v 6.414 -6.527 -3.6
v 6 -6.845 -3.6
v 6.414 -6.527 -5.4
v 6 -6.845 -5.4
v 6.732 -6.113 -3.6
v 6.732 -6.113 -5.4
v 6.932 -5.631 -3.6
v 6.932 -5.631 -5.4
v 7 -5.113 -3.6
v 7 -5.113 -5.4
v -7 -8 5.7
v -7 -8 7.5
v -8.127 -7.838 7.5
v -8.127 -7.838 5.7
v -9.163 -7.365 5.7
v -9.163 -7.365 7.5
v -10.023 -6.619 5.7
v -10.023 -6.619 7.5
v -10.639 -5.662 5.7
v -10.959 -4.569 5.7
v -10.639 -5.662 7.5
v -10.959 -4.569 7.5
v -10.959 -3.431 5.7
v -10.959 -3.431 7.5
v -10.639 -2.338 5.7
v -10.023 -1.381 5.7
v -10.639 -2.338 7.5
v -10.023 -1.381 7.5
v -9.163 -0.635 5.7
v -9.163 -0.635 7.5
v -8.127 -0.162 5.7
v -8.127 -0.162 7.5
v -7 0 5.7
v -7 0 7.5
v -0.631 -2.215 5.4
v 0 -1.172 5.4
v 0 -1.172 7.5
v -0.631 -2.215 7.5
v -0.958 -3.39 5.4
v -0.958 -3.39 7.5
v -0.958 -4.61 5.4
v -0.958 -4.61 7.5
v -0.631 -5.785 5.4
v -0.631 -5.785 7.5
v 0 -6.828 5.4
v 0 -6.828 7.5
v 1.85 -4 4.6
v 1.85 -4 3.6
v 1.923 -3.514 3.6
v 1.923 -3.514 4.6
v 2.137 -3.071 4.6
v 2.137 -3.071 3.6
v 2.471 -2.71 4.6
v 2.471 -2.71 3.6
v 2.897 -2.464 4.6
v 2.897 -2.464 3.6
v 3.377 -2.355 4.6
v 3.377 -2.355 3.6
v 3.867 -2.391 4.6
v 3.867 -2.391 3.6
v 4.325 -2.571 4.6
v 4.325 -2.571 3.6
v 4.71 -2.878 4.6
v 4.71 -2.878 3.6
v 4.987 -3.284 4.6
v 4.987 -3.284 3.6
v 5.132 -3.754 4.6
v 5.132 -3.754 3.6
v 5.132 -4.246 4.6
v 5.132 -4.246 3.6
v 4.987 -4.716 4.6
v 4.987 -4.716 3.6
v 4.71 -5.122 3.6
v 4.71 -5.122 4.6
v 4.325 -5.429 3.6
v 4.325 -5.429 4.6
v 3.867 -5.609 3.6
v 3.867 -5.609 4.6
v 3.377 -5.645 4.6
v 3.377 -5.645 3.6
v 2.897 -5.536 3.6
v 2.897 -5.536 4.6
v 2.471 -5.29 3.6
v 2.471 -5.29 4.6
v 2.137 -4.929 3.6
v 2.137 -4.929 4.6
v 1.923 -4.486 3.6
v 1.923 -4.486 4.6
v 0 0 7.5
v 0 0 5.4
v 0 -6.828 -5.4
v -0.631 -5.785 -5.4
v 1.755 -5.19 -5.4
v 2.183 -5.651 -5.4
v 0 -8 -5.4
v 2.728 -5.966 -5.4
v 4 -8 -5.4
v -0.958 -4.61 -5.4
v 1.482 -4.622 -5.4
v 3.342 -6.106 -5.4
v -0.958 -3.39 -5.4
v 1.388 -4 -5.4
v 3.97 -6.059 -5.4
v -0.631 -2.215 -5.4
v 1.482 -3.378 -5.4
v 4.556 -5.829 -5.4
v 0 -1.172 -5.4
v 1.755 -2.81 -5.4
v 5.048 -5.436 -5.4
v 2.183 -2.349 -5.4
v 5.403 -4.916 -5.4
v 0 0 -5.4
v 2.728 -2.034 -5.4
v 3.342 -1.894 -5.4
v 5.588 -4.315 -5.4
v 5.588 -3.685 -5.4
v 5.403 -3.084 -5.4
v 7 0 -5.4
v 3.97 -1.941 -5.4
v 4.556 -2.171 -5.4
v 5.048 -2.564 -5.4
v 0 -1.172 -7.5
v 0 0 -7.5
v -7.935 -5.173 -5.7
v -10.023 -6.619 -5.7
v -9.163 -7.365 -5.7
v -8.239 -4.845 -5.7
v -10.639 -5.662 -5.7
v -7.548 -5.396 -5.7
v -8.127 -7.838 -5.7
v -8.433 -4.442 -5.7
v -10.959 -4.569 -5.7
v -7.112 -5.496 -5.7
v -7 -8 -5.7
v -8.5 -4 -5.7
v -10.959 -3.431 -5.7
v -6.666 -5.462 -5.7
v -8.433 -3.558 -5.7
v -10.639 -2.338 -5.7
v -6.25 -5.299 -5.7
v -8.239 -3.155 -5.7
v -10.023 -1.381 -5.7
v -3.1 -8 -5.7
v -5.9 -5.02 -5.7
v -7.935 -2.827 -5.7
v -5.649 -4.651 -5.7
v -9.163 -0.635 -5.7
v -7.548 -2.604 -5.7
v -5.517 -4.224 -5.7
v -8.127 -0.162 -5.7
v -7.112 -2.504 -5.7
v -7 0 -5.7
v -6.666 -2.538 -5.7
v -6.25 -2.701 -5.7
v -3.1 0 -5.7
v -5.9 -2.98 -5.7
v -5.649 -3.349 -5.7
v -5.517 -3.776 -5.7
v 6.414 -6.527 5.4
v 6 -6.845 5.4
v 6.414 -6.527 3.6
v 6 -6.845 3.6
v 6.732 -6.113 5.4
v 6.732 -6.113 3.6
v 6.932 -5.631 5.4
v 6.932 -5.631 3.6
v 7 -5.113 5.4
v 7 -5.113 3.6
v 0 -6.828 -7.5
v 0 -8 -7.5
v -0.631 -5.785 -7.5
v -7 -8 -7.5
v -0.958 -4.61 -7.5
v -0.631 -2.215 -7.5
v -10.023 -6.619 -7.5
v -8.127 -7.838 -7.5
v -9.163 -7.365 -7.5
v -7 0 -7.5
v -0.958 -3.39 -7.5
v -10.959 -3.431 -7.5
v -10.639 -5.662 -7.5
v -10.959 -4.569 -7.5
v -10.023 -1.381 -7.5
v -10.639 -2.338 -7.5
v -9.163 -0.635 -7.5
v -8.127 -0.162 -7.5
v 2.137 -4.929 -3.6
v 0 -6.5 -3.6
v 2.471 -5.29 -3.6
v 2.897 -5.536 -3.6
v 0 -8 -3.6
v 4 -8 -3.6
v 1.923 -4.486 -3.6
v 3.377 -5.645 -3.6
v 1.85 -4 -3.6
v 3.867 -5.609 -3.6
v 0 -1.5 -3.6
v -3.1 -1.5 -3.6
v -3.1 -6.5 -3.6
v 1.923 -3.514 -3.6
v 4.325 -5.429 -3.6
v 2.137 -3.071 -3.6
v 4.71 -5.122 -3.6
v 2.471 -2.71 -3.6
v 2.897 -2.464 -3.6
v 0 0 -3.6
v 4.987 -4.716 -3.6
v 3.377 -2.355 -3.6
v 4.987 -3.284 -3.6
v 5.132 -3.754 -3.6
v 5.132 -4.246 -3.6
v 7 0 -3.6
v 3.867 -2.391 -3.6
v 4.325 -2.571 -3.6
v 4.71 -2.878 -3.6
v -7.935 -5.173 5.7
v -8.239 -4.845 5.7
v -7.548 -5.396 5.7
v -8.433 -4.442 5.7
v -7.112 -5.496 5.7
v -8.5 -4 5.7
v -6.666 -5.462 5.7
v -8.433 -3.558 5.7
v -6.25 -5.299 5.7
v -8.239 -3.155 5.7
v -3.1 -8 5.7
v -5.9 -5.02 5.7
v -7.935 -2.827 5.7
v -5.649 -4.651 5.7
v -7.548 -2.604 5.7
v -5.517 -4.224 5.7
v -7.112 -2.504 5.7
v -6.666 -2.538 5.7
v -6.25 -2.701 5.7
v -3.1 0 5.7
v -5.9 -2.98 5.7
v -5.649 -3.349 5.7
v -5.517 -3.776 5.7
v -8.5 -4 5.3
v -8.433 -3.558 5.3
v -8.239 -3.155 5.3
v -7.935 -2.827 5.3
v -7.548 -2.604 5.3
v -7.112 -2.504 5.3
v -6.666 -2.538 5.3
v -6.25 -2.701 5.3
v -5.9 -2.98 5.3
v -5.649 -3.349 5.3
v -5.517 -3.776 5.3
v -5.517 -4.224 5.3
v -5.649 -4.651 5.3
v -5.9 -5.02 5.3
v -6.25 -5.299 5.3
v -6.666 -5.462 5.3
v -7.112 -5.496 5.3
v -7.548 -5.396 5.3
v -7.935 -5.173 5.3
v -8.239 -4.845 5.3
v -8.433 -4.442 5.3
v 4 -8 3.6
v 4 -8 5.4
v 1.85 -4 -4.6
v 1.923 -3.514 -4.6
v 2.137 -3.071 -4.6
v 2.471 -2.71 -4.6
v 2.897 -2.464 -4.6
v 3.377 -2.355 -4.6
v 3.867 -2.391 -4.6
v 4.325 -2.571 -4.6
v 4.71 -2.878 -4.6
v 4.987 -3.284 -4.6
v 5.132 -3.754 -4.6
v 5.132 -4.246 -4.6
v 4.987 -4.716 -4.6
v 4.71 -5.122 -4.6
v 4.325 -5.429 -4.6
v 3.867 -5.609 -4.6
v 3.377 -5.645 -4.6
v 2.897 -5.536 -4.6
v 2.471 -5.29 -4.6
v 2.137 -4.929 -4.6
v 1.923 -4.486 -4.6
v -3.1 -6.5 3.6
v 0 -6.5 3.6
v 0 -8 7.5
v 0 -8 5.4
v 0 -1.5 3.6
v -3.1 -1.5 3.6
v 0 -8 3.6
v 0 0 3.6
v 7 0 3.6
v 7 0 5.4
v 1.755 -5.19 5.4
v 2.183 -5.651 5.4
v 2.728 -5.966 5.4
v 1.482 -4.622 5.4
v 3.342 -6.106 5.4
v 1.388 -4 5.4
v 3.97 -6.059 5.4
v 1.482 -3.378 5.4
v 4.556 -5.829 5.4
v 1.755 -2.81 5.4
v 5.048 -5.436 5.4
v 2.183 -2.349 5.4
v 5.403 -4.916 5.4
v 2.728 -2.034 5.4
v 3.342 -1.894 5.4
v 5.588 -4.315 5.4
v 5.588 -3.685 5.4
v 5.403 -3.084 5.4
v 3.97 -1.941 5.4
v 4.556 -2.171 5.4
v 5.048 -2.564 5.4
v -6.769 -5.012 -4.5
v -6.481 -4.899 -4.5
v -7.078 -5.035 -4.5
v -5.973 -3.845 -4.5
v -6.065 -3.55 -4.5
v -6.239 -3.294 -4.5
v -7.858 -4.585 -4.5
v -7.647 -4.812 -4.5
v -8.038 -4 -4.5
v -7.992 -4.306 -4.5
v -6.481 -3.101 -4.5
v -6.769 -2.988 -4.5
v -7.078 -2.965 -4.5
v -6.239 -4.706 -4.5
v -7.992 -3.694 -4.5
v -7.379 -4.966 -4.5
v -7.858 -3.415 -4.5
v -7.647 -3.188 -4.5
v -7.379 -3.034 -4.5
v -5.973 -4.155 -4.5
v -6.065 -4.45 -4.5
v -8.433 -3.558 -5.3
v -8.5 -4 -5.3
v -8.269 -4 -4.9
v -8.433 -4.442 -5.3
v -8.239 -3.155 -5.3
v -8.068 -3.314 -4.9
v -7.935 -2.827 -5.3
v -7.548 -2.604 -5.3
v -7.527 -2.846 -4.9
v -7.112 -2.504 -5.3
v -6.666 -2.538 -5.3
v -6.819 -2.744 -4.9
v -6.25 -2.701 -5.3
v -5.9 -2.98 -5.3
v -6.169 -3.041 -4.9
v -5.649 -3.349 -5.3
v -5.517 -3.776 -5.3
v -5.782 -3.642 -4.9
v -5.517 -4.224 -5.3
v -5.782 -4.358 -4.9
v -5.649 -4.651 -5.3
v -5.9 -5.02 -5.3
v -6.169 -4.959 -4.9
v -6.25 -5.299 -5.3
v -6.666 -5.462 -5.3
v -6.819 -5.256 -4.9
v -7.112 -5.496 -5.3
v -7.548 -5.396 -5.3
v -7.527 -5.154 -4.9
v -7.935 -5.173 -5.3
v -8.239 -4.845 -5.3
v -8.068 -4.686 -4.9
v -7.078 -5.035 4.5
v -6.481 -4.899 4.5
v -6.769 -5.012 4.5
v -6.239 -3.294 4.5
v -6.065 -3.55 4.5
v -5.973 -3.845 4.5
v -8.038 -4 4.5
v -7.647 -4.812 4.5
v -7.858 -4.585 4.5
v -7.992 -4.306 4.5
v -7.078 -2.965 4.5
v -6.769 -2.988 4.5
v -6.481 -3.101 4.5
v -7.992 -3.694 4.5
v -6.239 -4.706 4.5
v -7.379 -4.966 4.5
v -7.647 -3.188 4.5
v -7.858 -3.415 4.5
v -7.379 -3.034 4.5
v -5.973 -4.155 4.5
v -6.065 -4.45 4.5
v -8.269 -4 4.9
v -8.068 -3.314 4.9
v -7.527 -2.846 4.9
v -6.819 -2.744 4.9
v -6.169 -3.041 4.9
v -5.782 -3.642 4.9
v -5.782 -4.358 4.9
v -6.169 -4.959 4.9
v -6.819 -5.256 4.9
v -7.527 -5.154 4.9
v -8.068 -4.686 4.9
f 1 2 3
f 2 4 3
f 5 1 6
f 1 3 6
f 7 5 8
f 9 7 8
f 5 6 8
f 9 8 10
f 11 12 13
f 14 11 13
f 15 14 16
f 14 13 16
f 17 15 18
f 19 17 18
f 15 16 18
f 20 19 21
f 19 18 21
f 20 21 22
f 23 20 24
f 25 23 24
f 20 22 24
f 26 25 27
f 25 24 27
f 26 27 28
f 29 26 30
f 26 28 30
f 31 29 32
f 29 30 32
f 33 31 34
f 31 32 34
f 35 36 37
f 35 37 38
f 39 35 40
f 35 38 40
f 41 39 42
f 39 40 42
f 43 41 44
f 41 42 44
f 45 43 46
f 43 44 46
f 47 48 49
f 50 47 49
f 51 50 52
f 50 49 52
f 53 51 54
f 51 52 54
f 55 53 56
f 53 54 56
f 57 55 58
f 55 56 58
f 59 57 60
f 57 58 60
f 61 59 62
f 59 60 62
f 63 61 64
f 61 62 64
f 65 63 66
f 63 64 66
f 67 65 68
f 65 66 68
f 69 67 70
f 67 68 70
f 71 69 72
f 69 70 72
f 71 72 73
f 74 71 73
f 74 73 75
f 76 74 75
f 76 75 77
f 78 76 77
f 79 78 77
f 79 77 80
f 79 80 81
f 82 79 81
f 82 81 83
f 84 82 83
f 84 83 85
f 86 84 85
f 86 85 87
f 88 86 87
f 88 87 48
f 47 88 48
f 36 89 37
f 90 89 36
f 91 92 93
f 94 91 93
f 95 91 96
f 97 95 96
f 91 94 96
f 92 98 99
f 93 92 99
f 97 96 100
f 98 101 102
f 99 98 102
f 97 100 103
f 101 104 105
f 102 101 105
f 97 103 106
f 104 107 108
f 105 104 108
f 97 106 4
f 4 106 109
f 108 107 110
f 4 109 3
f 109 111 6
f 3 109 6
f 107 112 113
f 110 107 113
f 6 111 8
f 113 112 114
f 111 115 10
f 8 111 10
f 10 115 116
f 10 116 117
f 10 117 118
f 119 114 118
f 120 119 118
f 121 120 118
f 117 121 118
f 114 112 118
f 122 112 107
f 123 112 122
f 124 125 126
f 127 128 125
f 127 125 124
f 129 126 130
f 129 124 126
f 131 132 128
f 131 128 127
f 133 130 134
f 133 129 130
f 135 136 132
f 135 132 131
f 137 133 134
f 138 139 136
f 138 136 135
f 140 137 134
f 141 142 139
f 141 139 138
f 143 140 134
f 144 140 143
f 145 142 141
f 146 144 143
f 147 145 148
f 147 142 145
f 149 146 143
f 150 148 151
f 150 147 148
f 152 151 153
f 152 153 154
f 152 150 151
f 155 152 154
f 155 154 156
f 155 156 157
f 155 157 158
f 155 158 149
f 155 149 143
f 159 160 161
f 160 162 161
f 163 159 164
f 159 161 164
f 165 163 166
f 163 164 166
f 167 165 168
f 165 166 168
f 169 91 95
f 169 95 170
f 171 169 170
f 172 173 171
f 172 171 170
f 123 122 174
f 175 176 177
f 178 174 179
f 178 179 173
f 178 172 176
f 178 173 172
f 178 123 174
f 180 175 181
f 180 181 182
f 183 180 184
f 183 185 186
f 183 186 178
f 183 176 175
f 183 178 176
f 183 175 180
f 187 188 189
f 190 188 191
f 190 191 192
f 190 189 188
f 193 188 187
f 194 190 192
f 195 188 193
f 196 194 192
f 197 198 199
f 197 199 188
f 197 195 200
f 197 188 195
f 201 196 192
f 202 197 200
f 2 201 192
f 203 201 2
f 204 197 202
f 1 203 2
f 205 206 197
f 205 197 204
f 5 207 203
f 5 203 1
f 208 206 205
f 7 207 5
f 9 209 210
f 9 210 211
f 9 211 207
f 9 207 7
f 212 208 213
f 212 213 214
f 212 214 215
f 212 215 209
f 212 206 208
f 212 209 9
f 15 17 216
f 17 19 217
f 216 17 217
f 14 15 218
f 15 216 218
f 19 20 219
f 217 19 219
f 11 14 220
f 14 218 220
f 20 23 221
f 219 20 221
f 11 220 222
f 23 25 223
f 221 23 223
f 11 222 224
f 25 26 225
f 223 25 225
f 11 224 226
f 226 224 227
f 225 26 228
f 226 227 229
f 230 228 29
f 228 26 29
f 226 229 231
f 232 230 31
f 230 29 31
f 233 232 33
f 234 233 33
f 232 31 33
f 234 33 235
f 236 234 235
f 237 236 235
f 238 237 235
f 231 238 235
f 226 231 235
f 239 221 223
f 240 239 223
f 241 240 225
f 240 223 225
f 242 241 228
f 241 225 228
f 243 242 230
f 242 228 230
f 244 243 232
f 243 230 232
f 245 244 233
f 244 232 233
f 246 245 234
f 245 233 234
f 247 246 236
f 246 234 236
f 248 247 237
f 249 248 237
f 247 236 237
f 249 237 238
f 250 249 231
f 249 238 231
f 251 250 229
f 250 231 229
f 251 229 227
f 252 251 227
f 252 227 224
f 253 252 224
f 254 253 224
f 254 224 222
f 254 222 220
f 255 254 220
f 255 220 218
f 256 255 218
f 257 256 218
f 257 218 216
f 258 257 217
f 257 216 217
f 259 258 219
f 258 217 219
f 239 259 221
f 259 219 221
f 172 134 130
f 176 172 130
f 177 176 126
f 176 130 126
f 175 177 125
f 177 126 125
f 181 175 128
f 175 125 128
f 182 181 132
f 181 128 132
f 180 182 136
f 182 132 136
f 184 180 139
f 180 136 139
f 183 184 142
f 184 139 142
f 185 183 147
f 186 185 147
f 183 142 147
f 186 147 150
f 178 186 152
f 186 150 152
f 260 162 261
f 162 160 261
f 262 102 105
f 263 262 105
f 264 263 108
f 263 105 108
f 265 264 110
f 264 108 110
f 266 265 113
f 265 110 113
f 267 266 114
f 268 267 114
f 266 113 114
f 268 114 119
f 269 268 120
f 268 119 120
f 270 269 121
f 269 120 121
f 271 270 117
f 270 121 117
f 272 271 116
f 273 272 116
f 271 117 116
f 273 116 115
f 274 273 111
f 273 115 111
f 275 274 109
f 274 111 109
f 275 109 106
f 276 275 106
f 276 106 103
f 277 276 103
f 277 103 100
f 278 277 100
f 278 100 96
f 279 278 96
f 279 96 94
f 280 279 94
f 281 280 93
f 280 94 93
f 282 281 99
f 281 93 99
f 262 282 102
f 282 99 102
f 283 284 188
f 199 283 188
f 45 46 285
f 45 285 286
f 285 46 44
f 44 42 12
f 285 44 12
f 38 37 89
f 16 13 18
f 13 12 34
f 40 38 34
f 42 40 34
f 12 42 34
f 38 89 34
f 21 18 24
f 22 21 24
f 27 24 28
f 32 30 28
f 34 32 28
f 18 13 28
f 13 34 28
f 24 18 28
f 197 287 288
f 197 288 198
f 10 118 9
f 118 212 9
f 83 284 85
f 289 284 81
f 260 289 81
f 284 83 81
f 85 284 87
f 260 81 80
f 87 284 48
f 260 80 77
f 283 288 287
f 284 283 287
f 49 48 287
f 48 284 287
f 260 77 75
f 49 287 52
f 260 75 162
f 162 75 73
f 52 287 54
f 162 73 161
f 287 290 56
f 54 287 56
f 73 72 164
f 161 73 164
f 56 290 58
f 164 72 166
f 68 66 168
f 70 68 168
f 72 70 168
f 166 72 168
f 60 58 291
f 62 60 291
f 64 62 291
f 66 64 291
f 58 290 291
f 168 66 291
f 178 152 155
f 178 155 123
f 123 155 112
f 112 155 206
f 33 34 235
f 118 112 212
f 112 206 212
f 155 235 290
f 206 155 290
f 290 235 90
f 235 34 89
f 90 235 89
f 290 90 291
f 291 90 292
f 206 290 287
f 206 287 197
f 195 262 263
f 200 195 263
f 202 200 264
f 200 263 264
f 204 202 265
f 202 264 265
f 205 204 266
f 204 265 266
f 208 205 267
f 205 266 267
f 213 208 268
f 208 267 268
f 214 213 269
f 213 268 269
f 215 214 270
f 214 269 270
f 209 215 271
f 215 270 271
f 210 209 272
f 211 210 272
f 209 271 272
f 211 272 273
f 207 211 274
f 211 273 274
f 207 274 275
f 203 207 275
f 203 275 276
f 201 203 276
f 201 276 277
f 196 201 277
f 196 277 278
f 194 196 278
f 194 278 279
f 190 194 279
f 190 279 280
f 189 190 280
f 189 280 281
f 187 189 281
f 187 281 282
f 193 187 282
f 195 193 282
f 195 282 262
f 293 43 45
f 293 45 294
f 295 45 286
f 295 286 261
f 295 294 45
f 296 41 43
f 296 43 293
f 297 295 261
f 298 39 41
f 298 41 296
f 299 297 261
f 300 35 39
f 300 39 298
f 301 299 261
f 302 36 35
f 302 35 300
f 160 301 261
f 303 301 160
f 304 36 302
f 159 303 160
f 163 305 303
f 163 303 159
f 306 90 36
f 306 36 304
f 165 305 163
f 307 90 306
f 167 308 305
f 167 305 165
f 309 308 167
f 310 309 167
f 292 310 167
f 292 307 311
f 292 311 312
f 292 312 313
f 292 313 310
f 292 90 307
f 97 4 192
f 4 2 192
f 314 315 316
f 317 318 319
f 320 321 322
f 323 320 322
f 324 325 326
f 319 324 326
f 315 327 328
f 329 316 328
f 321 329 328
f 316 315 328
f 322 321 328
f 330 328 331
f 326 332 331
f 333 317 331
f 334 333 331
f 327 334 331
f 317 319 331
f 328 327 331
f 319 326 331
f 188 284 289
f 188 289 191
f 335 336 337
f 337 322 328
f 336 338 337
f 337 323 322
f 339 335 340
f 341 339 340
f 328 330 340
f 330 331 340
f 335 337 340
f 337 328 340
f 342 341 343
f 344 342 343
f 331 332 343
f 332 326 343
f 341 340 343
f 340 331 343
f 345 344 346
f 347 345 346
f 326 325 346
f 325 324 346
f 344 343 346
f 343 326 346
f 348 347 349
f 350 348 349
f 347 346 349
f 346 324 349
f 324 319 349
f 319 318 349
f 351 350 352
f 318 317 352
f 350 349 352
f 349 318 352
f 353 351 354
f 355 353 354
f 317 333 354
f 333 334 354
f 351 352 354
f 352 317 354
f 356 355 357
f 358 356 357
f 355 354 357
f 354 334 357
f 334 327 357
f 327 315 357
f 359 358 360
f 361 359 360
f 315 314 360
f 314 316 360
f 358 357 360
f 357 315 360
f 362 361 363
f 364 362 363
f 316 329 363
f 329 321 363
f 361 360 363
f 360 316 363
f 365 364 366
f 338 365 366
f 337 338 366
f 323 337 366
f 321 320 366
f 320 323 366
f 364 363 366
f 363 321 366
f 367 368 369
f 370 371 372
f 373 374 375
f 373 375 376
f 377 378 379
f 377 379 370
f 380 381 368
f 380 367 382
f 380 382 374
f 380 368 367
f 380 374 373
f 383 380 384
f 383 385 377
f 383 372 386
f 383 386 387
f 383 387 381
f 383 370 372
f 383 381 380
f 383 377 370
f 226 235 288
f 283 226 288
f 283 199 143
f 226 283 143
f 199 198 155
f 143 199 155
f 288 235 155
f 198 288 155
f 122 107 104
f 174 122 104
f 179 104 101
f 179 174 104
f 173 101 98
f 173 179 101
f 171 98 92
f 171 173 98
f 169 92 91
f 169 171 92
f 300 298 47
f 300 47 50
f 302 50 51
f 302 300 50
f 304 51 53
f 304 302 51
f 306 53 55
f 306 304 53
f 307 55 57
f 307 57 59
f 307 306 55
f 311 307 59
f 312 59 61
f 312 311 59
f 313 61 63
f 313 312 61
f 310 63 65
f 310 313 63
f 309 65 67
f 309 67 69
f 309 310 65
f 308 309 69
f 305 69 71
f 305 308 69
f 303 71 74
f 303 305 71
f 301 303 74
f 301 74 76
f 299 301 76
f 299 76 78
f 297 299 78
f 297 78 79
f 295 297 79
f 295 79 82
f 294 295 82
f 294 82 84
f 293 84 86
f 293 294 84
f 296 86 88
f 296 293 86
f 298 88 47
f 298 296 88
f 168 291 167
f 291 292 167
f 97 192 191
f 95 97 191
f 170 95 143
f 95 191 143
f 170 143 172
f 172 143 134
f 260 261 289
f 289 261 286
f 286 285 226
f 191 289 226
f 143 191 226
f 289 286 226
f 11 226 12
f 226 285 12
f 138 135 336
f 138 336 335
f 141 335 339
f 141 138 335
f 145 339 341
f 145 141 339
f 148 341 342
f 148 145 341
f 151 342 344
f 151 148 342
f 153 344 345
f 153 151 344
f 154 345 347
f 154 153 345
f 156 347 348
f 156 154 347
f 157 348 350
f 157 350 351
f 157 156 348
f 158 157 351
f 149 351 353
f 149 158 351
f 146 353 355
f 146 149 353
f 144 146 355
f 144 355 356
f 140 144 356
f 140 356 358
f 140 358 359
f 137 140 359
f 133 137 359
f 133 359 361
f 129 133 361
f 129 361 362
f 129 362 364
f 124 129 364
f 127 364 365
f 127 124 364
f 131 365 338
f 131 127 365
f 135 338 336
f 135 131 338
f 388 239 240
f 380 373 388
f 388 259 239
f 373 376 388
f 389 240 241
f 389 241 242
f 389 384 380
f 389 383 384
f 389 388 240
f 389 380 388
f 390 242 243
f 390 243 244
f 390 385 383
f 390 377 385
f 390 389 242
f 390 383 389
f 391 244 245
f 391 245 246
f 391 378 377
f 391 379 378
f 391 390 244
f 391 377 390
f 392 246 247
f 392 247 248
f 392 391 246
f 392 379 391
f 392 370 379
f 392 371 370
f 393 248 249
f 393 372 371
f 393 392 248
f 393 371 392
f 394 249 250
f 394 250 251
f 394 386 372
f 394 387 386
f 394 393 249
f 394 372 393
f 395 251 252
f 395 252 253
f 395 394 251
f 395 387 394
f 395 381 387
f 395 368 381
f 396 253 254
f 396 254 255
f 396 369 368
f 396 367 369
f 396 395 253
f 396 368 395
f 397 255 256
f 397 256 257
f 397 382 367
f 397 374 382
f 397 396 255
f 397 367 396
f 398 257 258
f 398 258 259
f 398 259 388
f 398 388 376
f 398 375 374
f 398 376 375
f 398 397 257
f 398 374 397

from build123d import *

# Parameters (mm, degrees)
RESSALTO_EXTRUS_O1_DEPTH   = 7.5
ESBO_O2_W                  = 7.9
ESBO_O2_H                  = 11.4
ESBO_O2_W_2                = 7
ESBO_O2_H_2                = 2.1
ESBO_O2_H_3                = 7.2
CORTE_EXTRUS_O1_DEPTH      = 1
CORTE_EXTRUS_O1_DEPTH_BACK = 9
ESBO_O3_W                  = 7.2
ESBO_O3_H                  = 5
CORTE_EXTRUS_O2_DEPTH      = 8
CORTE_EXTRUS_O2_DEPTH_BACK = 12
ESBO_O4_R                  = 1.65
CORTE_EXTRUS_O3_DEPTH      = 3.1
CORTE_EXTRUS_O3_DEPTH_BACK = 13.9
ESBO_O5_R                  = 1.5
RESSALTO_EXTRUS_O2_DEPTH   = 1.2
ESBO_O6_R                  = 4.5
CORTE_EXTRUS_O4_DEPTH      = 2.1
FILETE1_R                  = 2
CHANFRO1_SIZE              = 0.8
CHANFRO1_SIZE2             = 0.461880215
CHANFRO1_PART_2_SIZE       = 0.8
CHANFRO1_PART_2_SIZE2      = 0.461880215
CHANFRO1_PART_3_SIZE       = 0.8
CHANFRO1_PART_3_SIZE2      = 0.461880215
CHANFRO1_PART_4_SIZE       = 0.8
CHANFRO1_PART_4_SIZE2      = 0.461880215


with BuildPart() as part:
    # Esboço1 → Ressalto-extrusão1 (new body, symmetric)
    with BuildSketch(Plane.XY):
        with BuildLine():
            Line((-7, 0), (7, 0))
            Line((7, 0), (7, -6.267949192))
            Line((7, -6.267949192), (4, -8))
            Line((4, -8), (-7, -8))
            ThreePointArc((-7, -8), (-11, -4), (-7, 0))
        make_face()
    extrude(amount=RESSALTO_EXTRUS_O1_DEPTH, both=True)

    # Esboço2 → Corte-extrusão1 (cut, two sides)
    with BuildSketch(Plane(origin=(0, 0, 0), x_dir=(1, 0, 0), z_dir=(0, 1, 0))) as corte_extrus_o1_sk:
        with Locations((-7.05, 0)):
            Rectangle(ESBO_O2_W, ESBO_O2_H)
        with Locations((3.5, -6.45)):
            Rectangle(ESBO_O2_W_2, ESBO_O2_H_2)
        with Locations((3.5, 6.45)):
            Rectangle(ESBO_O2_W_2, ESBO_O2_H_2)
        with Locations((3.5, 0)):
            Rectangle(ESBO_O2_W_2, ESBO_O2_H_3)
    extrude(amount=CORTE_EXTRUS_O1_DEPTH, mode=Mode.SUBTRACT)
    extrude(corte_extrus_o1_sk.sketch, amount=-CORTE_EXTRUS_O1_DEPTH_BACK, mode=Mode.SUBTRACT)

    # Esboço3 → Corte-extrusão2 (cut, two sides)
    with BuildSketch(Plane(origin=(0, 0, 0), x_dir=(0, 0, -1), z_dir=(1, 0, 0))) as corte_extrus_o2_sk:
        with Locations((0, -4)):
            Rectangle(ESBO_O3_W, ESBO_O3_H)
    extrude(amount=CORTE_EXTRUS_O2_DEPTH, mode=Mode.SUBTRACT)
    extrude(corte_extrus_o2_sk.sketch, amount=-CORTE_EXTRUS_O2_DEPTH_BACK, mode=Mode.SUBTRACT)

    # Esboço4 → Corte-extrusão3 (cut, two sides)
    with BuildSketch(Plane(origin=(0, 0, -5.4), x_dir=(-1, 0, 0), z_dir=(0, 0, -1))) as corte_extrus_o3_sk:
        with Locations((-3.5, -4)):
            Circle(ESBO_O4_R)
    extrude(amount=CORTE_EXTRUS_O3_DEPTH, mode=Mode.SUBTRACT)
    extrude(corte_extrus_o3_sk.sketch, amount=-CORTE_EXTRUS_O3_DEPTH_BACK, mode=Mode.SUBTRACT)

    # Esboço5 → Ressalto-extrusão2 (add)
    with BuildSketch(Plane(origin=(0, 0, 5.7), x_dir=(-1, 0, 0), z_dir=(0, 0, -1))):
        with Locations((7, -4)):
            Circle(ESBO_O5_R)
    ressalto_extrus_o2 = extrude(amount=RESSALTO_EXTRUS_O2_DEPTH)

    # Esboço6 → Corte-extrusão4 (cut)
    with BuildSketch(Plane.XY.offset(7.5)):
        with Locations((3.5, -4)):
            Circle(ESBO_O6_R)
    corte_extrus_o4 = extrude(amount=-CORTE_EXTRUS_O4_DEPTH, mode=Mode.SUBTRACT)

    # Espelhar1: Ressalto-extrusão2, Corte-extrusão4 across plane
    add(ressalto_extrus_o2.mirror(Plane.XY))
    add(corte_extrus_o4.mirror(Plane.XY), mode=Mode.SUBTRACT)

    # Filete1
    filete1_edges = [part.edges().sort_by_distance(p)[0] for p in [
        (7, -6.267949192, 4.5),
        (7, -6.267949192, -4.5),
    ]]
    fillet(filete1_edges, radius=FILETE1_R)

    # Chanfro1
    chanfro1_edges = [part.edges().sort_by_distance(p)[0] for p in [
        (5.15, -4, -5.4),
    ]]
    chanfro1_side = [part.faces().sort_by_distance(p)[0] for p in [
        (5.15, -4, -4.5),
    ]]
    chamfer(chanfro1_edges, length=CHANFRO1_SIZE, length2=CHANFRO1_SIZE2, reference=chanfro1_side[0])

    # Chanfro1 part 2
    chanfro1_part_2_edges = [part.edges().sort_by_distance(p)[0] for p in [
        (5.15, -4, 5.4),
    ]]
    chanfro1_part_2_side = [part.faces().sort_by_distance(p)[0] for p in [
        (5.15, -4, 4.5),
    ]]
    chamfer(chanfro1_part_2_edges, length=CHANFRO1_PART_2_SIZE, length2=CHANFRO1_PART_2_SIZE2, reference=chanfro1_part_2_side[0])

    # Chanfro1 part 3
    chanfro1_part_3_edges = [part.edges().sort_by_distance(p)[0] for p in [
        (-5.5, -4, 4.5),
    ]]
    chanfro1_part_3_side = [part.faces().sort_by_distance(p)[0] for p in [
        (-5.5, -4, 5.1),
    ]]
    chamfer(chanfro1_part_3_edges, length=CHANFRO1_PART_3_SIZE, length2=CHANFRO1_PART_3_SIZE2, reference=chanfro1_part_3_side[0])

    # Chanfro1 part 4
    chanfro1_part_4_edges = [part.edges().sort_by_distance(p)[0] for p in [
        (-5.5, -4, -4.5),
    ]]
    chanfro1_part_4_side = [part.faces().sort_by_distance(p)[0] for p in [
        (-5.5, -4, -5.1),
    ]]
    chamfer(chanfro1_part_4_edges, length=CHANFRO1_PART_4_SIZE, length2=CHANFRO1_PART_4_SIZE2, reference=chanfro1_part_4_side[0])


solid = part.part
